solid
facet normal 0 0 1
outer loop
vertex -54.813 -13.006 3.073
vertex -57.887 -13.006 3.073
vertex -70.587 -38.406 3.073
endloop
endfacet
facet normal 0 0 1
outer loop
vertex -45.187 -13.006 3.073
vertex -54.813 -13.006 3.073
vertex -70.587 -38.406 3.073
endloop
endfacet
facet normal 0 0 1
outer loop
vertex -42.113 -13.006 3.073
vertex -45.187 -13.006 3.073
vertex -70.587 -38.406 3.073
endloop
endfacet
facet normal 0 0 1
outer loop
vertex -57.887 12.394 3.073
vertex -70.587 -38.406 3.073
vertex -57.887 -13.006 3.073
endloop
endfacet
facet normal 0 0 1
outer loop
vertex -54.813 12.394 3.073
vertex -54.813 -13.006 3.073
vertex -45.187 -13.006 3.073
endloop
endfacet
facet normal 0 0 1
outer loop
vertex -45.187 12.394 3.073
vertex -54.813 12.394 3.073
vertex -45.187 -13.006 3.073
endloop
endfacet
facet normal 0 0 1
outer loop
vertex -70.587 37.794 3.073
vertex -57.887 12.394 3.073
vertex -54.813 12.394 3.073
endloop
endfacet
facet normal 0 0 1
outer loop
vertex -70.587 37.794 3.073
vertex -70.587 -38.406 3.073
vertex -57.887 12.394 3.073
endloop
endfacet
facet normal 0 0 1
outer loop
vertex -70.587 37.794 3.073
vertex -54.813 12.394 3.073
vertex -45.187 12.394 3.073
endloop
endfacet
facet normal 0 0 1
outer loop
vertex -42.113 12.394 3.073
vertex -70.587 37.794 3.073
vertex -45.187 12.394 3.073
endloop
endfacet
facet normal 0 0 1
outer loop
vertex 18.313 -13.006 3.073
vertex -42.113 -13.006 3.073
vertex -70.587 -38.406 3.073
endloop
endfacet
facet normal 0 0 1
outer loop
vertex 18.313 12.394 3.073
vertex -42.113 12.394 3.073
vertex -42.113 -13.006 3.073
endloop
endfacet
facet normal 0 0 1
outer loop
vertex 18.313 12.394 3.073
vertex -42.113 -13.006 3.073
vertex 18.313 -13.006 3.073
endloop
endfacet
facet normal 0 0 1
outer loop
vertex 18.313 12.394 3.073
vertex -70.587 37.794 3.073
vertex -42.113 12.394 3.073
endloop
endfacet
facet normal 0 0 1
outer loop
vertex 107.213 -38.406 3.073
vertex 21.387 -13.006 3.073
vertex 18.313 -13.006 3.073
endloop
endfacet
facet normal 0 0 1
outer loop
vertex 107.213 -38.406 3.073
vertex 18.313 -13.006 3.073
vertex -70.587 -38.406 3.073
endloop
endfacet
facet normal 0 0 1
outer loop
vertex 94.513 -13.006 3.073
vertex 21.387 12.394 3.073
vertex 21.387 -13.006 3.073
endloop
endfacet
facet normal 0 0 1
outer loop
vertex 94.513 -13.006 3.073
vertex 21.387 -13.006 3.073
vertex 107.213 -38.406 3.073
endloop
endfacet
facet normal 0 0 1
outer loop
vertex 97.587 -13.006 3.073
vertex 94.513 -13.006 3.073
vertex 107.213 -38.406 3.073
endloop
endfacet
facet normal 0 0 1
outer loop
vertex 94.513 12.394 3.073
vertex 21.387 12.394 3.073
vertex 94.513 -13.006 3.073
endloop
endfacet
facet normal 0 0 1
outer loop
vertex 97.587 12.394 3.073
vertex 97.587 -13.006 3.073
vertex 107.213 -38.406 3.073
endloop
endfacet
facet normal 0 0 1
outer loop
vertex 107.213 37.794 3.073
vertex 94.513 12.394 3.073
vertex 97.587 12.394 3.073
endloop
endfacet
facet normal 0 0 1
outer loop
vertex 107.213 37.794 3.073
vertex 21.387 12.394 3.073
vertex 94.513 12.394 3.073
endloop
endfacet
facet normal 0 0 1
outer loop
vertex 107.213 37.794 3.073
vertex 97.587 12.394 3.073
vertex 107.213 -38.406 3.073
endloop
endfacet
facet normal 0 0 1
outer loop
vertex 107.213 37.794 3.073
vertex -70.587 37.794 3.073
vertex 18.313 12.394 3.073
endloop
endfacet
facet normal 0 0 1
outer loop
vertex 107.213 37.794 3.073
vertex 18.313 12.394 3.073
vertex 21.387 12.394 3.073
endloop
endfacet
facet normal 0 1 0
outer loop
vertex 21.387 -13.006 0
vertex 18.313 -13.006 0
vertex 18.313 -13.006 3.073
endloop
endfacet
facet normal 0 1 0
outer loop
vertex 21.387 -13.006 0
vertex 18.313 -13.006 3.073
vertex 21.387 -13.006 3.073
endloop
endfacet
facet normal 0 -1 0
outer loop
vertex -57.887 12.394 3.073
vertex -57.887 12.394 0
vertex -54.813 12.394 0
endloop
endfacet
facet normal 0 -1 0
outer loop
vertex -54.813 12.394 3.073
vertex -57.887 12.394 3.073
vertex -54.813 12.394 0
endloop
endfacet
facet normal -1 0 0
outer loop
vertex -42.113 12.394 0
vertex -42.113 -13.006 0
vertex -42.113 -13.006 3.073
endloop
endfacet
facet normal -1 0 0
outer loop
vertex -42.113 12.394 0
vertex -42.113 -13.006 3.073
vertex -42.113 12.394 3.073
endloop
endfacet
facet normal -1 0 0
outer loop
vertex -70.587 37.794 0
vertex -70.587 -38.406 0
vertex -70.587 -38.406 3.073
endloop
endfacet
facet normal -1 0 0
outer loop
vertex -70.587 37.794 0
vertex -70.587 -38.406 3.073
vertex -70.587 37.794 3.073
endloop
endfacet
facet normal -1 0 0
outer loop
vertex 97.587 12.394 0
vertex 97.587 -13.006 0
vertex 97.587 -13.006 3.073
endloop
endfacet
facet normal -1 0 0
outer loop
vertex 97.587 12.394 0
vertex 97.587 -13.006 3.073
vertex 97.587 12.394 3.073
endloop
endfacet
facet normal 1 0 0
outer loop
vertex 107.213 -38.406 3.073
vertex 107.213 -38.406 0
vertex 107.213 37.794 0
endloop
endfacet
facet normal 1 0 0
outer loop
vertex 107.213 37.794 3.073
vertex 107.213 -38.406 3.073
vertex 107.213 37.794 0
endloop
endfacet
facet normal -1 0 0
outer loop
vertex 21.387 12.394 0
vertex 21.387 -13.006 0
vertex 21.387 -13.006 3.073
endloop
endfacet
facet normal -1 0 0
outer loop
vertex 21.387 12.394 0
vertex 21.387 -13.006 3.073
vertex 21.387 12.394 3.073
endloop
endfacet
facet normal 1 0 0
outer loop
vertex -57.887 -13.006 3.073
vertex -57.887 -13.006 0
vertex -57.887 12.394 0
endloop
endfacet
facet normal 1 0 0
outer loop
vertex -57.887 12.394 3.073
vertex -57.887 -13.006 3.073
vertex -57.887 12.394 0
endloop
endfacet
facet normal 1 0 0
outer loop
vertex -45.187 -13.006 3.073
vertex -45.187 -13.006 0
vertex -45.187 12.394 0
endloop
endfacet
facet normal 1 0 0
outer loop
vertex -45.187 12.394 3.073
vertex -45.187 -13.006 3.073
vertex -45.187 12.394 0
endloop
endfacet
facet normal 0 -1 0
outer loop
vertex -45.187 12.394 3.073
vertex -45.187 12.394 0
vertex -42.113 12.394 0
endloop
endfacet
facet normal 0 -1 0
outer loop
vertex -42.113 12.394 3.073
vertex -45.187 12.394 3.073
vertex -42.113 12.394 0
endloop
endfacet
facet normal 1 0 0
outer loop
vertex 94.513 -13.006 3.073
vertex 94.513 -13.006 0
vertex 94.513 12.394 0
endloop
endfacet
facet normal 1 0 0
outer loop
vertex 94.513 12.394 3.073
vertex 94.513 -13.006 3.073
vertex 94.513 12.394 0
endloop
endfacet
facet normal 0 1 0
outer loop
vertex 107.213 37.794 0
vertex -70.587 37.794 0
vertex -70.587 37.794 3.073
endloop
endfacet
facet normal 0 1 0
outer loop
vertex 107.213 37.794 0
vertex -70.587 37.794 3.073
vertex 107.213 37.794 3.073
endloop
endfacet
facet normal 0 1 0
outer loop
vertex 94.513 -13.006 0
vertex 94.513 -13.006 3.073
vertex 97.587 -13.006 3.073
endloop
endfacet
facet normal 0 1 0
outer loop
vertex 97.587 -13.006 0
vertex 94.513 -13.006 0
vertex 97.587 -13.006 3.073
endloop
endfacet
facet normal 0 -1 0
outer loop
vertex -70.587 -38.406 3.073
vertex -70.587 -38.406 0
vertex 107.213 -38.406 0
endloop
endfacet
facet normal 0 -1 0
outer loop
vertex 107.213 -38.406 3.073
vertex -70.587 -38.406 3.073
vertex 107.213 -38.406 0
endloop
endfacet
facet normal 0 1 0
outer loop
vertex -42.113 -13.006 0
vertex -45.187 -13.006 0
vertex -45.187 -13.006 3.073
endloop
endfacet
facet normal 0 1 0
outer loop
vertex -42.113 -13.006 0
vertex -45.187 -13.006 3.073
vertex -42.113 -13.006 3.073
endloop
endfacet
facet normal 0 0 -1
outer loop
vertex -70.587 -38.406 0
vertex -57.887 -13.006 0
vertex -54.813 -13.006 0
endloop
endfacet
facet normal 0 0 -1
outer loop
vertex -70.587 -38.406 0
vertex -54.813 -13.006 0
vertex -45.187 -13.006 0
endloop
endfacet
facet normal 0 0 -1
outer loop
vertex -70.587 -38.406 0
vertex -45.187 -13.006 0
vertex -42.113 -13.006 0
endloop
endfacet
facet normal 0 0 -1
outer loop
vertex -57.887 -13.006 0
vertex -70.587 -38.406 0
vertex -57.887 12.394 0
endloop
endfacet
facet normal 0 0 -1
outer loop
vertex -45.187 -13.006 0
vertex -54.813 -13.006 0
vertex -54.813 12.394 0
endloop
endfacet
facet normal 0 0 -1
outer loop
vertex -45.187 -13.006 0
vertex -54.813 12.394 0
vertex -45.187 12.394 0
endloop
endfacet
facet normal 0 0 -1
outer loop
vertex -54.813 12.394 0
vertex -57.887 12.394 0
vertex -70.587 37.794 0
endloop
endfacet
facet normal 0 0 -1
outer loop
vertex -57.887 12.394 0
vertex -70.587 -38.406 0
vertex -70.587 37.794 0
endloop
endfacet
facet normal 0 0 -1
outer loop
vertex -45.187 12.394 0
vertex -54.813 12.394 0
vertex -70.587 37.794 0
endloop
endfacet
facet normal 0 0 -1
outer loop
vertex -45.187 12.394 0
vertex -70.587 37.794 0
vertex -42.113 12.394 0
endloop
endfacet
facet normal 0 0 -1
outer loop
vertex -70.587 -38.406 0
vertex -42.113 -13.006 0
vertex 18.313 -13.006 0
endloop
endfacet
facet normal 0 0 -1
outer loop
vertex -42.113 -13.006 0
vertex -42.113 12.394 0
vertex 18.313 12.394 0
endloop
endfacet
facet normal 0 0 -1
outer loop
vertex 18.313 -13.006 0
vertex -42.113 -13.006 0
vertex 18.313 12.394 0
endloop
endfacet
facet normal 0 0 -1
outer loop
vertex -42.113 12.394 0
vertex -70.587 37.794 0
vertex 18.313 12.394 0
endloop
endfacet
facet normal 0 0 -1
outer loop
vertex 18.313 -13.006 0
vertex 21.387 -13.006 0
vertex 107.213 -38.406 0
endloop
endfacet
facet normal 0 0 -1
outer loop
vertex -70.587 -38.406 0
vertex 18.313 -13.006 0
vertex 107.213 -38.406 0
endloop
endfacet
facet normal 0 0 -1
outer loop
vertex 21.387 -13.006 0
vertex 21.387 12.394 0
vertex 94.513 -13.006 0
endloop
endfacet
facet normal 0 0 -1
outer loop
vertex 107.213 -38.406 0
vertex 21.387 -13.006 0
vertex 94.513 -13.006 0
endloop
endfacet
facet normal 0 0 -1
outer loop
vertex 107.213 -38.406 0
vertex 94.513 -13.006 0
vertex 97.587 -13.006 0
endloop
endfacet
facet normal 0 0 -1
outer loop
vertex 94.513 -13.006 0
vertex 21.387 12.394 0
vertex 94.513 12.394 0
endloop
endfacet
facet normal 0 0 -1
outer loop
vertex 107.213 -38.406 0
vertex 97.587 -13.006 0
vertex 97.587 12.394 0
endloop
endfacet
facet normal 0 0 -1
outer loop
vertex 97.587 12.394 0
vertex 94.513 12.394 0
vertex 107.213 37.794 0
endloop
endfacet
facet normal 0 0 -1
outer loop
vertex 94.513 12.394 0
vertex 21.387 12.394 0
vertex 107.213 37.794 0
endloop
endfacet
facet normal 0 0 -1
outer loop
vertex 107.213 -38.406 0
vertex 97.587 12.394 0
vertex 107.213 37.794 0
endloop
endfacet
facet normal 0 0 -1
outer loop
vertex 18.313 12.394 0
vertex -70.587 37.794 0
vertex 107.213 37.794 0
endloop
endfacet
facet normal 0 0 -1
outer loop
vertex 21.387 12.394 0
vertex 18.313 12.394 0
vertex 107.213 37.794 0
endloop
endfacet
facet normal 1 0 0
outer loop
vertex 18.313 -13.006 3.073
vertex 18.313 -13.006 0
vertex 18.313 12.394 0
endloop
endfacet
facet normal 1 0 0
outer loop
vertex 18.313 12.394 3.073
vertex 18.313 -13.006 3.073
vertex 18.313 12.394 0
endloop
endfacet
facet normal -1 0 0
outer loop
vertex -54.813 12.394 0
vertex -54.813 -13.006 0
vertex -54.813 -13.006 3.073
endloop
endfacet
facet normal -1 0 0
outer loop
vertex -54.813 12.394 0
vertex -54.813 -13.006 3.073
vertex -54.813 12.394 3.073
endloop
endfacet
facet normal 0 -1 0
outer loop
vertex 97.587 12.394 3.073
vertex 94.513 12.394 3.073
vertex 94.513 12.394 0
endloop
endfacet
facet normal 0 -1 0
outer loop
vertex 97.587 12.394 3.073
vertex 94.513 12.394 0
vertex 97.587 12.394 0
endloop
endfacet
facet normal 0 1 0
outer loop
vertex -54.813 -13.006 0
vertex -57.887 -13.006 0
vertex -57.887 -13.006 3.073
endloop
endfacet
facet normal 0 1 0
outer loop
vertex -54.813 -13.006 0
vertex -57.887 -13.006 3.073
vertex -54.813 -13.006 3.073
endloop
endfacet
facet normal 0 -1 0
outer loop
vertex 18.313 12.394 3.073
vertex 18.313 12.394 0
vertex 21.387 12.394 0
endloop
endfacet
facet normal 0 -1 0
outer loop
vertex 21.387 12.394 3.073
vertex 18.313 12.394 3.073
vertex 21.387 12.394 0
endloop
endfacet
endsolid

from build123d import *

# Parameters (mm, degrees)
F0_W     = 177.8
F0_H     = 76.2
F0_W_2   = 3.0734
F0_H_2   = 25.4
F1_DEPTH = 3.0734


with BuildPart() as f1:
    # F0 (on Top) → F1 (new body)
    with BuildSketch(Plane.XY):
        with Locations((18.3134, -0.306201)):
            Rectangle(F0_W, F0_H)
        with Locations((19.8501, -0.306201)):
            Rectangle(F0_W_2, F0_H_2, mode=Mode.SUBTRACT)
        with Locations((-56.3499, -0.306201)):
            Rectangle(F0_W_2, F0_H_2, mode=Mode.SUBTRACT)
        with Locations((-43.6499, -0.306201)):
            Rectangle(F0_W_2, F0_H_2, mode=Mode.SUBTRACT)
        with Locations((96.0501, -0.306201)):
            Rectangle(F0_W_2, F0_H_2, mode=Mode.SUBTRACT)
    extrude(amount=F1_DEPTH)


solid = f1.part
